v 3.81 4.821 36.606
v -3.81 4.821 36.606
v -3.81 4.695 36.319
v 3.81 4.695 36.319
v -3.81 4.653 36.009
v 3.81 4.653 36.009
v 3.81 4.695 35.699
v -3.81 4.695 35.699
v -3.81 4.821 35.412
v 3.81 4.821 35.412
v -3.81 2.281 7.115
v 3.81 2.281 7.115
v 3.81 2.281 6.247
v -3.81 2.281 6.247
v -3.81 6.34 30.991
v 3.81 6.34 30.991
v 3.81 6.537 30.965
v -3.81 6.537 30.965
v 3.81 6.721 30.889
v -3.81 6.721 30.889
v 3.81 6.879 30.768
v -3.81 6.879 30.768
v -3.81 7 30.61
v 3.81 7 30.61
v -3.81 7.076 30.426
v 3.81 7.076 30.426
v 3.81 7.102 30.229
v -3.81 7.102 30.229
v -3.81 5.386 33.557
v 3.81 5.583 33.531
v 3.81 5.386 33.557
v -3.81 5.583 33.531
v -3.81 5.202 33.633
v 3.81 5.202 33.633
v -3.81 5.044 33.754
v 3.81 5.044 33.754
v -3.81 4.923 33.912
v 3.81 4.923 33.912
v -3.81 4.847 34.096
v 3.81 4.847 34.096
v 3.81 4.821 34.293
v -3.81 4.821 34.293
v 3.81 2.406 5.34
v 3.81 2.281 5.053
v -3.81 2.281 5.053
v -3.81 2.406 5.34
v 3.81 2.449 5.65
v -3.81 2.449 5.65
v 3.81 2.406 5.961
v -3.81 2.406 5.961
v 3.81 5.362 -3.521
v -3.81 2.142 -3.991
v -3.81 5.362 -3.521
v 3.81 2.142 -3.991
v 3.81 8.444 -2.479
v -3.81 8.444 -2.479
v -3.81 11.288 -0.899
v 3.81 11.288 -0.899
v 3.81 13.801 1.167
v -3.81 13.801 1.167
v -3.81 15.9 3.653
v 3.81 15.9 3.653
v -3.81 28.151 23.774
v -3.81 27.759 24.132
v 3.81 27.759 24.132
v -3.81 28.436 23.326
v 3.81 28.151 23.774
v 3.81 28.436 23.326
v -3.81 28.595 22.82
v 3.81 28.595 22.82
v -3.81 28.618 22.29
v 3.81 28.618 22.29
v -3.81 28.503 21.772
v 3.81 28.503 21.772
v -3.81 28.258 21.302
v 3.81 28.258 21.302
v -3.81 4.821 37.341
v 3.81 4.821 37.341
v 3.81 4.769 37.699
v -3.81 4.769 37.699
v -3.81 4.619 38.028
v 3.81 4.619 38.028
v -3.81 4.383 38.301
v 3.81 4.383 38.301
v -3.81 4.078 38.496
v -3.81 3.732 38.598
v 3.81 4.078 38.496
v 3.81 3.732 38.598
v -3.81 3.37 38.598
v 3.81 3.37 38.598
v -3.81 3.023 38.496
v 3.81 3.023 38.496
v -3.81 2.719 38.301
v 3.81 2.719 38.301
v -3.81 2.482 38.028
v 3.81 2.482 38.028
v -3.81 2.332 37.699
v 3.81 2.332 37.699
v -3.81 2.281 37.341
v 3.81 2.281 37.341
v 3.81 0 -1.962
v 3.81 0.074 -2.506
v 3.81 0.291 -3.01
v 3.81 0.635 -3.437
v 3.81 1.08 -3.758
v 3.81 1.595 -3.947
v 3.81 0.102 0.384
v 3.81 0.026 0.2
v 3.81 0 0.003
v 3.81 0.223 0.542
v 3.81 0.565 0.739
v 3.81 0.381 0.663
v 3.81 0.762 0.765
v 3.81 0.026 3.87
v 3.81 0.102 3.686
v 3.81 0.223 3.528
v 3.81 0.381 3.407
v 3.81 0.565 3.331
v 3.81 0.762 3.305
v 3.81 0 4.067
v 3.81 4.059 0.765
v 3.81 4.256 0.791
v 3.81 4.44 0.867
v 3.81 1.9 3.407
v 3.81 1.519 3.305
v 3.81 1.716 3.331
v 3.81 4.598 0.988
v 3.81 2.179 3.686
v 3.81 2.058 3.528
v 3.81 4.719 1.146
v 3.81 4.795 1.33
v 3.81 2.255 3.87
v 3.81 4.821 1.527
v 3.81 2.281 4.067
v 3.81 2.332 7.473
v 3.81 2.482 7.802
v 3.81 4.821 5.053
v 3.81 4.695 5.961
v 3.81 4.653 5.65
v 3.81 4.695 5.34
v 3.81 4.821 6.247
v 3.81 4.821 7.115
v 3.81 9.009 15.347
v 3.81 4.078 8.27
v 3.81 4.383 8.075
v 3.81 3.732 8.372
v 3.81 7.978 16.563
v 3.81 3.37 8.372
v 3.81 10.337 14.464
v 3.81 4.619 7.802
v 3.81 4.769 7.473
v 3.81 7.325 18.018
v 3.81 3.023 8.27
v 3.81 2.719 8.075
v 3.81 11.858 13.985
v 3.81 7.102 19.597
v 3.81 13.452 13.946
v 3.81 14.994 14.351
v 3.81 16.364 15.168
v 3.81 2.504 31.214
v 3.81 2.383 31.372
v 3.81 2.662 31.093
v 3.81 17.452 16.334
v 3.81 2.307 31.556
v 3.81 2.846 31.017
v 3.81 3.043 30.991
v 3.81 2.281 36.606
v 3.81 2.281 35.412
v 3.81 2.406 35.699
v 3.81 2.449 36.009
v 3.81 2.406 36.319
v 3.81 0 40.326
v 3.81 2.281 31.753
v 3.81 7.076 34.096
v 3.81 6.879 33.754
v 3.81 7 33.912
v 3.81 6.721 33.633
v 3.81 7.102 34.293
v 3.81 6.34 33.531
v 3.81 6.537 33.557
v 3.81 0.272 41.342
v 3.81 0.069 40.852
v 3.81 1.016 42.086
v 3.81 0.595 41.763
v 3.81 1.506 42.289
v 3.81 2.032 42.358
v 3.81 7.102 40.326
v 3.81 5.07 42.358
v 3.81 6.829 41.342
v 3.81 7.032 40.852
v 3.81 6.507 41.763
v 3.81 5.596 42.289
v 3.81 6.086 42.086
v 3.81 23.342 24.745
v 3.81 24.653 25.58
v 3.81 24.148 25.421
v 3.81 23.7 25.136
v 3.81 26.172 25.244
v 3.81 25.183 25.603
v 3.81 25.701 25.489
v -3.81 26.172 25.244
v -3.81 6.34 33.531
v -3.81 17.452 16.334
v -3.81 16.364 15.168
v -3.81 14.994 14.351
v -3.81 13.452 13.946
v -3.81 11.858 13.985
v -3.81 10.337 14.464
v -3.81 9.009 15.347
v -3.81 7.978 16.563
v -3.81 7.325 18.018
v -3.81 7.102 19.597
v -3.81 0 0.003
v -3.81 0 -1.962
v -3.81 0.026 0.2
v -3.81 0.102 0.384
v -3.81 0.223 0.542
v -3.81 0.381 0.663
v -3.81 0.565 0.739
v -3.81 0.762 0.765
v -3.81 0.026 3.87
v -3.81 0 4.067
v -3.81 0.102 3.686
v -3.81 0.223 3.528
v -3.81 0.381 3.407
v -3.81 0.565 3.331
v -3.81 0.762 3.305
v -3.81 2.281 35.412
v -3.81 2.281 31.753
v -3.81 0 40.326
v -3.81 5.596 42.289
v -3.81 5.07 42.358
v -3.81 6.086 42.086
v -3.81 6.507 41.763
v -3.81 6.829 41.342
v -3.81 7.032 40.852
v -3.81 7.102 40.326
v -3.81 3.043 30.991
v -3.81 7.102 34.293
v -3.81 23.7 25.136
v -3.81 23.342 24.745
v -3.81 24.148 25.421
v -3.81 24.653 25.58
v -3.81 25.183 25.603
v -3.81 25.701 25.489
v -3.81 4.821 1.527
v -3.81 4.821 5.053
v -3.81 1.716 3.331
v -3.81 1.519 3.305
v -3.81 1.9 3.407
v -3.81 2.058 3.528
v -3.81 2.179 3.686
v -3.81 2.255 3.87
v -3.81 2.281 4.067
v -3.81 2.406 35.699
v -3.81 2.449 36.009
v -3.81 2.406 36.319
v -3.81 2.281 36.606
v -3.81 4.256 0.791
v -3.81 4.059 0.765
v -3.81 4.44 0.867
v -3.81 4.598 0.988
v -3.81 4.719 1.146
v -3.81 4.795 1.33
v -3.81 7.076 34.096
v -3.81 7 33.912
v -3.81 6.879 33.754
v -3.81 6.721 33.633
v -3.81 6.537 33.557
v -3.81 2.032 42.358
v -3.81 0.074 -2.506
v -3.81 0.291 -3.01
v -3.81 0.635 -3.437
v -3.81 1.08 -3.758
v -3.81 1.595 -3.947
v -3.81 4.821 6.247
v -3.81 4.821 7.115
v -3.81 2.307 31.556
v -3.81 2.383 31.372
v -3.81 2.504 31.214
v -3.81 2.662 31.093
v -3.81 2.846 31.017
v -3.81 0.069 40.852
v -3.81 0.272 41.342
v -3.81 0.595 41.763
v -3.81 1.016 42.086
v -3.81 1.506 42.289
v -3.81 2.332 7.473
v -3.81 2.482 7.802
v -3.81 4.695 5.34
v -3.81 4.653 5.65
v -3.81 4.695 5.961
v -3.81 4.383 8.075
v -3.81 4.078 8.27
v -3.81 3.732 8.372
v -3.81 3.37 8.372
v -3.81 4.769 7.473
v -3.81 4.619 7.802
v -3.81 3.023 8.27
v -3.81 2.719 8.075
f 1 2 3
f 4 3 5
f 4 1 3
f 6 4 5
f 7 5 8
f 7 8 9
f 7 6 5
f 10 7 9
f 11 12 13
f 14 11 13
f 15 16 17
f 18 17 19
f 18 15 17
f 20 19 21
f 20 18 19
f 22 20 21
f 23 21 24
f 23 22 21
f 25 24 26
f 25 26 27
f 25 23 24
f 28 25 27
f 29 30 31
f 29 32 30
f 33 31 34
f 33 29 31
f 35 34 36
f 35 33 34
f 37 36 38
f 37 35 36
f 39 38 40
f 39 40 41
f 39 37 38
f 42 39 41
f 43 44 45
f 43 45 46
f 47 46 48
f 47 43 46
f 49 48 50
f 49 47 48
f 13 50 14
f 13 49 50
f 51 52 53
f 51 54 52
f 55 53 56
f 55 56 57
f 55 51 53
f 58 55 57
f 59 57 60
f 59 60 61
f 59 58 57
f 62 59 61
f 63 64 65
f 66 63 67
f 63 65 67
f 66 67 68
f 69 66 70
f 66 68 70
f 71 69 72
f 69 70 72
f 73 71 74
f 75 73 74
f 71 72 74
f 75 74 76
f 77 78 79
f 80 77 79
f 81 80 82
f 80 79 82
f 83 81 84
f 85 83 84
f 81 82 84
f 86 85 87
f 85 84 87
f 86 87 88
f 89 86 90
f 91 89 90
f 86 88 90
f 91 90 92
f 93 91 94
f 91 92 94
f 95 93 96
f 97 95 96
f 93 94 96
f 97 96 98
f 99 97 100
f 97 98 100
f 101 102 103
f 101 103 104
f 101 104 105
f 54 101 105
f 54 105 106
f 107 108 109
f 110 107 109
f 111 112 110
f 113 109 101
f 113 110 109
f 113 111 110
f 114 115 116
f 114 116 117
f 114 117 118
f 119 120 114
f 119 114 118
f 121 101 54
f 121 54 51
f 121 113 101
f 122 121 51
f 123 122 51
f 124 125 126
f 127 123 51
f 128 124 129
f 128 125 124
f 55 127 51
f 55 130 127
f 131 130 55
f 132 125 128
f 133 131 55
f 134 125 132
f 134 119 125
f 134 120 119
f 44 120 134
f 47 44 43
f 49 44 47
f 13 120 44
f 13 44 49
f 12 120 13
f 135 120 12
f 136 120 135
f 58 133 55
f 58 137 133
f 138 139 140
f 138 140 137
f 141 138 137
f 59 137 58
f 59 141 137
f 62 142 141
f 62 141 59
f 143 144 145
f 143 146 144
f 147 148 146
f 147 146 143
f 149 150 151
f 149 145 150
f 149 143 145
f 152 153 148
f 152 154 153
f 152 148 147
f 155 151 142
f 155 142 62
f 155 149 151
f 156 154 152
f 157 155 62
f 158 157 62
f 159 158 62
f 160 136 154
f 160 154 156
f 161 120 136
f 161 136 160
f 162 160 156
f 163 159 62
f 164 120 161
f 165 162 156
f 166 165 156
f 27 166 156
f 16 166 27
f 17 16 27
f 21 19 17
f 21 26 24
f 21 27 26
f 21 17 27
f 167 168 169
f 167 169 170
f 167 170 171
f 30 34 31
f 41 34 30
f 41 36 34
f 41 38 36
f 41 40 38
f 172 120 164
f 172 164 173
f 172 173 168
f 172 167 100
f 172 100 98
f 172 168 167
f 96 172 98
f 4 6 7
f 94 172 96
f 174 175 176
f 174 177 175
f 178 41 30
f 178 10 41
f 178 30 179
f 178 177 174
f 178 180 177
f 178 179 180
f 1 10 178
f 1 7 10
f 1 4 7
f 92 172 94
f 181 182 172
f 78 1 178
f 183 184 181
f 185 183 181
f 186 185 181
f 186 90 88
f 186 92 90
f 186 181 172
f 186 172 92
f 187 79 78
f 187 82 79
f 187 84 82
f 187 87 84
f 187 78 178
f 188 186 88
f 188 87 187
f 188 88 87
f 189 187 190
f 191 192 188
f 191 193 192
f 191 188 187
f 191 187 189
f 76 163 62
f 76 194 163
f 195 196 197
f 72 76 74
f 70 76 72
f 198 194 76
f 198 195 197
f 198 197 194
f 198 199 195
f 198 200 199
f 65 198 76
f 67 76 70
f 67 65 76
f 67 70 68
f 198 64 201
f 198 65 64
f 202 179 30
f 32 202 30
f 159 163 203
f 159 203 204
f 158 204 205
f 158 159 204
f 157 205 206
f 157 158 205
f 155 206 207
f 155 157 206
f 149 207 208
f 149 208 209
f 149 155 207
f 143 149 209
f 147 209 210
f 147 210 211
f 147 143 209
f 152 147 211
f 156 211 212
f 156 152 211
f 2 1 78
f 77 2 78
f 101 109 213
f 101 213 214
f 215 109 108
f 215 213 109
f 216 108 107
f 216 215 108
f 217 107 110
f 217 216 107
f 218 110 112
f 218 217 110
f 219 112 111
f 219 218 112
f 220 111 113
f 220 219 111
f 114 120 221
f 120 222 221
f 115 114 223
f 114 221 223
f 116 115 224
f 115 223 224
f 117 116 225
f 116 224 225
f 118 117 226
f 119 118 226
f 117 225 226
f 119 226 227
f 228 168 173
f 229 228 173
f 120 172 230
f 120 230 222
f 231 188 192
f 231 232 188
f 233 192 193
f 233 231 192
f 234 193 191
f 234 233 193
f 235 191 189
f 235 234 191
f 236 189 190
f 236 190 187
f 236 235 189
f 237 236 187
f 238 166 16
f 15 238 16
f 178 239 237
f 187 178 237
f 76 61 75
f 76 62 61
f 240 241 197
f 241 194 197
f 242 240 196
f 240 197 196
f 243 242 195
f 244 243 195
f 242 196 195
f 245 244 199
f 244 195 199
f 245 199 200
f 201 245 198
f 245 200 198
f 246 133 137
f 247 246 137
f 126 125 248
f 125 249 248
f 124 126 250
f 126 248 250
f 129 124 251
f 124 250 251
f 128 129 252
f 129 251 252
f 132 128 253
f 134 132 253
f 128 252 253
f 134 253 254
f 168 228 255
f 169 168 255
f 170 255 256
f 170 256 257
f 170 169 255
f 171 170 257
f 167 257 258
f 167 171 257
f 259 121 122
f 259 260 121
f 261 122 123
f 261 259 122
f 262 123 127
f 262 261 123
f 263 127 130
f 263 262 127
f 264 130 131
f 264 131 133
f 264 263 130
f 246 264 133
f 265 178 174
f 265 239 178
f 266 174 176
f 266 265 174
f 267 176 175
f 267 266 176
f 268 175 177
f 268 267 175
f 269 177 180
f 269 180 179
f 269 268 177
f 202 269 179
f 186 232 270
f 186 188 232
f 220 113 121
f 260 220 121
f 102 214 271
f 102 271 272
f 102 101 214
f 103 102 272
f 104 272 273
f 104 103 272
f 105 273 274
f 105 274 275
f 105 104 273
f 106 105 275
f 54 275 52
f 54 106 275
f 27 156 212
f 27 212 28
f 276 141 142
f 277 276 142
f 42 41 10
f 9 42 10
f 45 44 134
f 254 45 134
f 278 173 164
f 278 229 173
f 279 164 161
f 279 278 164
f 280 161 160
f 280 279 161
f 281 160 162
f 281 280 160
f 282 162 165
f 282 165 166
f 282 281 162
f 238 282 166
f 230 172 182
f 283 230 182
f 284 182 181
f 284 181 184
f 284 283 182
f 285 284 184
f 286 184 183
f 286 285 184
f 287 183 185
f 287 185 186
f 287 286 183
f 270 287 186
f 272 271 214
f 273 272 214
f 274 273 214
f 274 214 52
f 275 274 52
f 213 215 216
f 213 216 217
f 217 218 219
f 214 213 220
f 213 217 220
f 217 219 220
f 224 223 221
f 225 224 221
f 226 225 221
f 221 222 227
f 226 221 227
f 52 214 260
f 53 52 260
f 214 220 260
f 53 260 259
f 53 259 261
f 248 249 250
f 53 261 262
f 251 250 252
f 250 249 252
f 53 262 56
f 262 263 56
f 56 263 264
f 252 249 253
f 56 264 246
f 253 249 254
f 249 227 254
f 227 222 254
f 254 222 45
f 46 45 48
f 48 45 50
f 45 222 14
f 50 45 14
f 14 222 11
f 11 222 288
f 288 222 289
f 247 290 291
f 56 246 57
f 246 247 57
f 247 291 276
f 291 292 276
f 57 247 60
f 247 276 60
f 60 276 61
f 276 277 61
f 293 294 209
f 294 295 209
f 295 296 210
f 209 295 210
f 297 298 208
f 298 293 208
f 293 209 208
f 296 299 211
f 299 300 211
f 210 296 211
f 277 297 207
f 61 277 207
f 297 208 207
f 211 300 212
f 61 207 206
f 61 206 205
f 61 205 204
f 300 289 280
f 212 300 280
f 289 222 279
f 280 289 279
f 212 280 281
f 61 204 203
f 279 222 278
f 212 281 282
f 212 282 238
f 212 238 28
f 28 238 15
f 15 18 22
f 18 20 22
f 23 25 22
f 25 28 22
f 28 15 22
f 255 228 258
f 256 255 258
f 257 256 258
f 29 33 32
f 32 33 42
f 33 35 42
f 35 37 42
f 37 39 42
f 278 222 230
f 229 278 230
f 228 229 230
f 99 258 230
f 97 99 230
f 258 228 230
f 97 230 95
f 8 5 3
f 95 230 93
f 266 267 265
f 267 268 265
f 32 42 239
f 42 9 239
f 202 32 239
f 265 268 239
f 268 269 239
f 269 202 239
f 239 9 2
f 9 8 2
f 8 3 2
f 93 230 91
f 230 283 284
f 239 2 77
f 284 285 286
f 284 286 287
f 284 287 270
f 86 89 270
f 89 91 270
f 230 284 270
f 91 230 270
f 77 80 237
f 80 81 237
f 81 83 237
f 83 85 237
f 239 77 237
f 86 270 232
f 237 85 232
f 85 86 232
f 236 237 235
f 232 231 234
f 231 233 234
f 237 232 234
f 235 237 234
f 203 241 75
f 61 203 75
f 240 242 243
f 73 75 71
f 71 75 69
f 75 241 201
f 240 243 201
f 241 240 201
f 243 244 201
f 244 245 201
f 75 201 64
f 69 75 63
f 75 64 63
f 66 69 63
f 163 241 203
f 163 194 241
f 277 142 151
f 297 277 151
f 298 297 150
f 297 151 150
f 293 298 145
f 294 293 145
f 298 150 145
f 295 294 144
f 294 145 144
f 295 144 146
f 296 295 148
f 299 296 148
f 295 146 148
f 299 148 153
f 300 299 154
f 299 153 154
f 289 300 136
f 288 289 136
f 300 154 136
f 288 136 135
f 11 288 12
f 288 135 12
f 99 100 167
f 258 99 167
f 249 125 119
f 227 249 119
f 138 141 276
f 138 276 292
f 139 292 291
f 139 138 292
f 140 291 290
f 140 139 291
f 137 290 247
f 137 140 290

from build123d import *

# Parameters (mm, degrees)
F1_DEPTH = 3.81
F2_R     = 2.032
F4_DEPTH = 7.621
F5_R     = 0.762
F7_DEPTH = 7.62


# Not quite as in the source:
# - a feature names something its author has since deleted; it is built from what else it names


with BuildPart() as f1:
    # F0 (on Right) → F1 (new body, symmetric)
    with BuildSketch(Plane.YZ):
        with BuildLine():
            Line((0, 42.3580370843), (0, 0))
            Line((0, 0), (0, -3.979871033))
            ThreePointArc((0, -3.979871033), (8.9499402185, -2.2460183558), (15.9004898533, 3.6529251764))
            Line((15.9004898533, 3.6529251764), (29.4239599312, 22.9664420122))
            Line((29.4239599312, 22.9664420122), (24.5073227445, 26.4091084329))
            Line((24.5073227445, 26.4091084329), (17.4524241549, 16.3336690744))
            ThreePointArc((17.4524241549, 16.3336690744), (11.0805919315, 14.1707234894), (7.1017071605, 19.5972376068))
            Line((7.1017071605, 19.5972376068), (7.1017071605, 42.3580370843))
            Line((7.1017071605, 42.3580370843), (0, 42.3580370843))
        make_face()
    extrude(amount=F1_DEPTH, both=True)

    # F2
    f2_edges = [f1.edges().sort_by_distance(p)[0] for p in [
        (0, 7.101707, 42.358037),
        (0, 0, 42.358037),
        (0, 29.42396, 22.966442),
        (0, 24.507323, 26.409108),
        (0, 0, -3.979871),
    ]]
    fillet(f2_edges, radius=F2_R)

    # F3 (on face) → F4 (cut, through all)
    with BuildSketch(Plane.YZ.offset(3.81)):
        with BuildLine():
            Line((4.8208535802, 33.5311107337), (4.8208535802, 37.3411107337))
            ThreePointArc((4.8208535802, 37.3411107337), (3.5508535802, 38.6111107337), (2.2808535802, 37.3411107337))
            Line((2.2808535802, 37.3411107337), (2.2808535802, 30.9911107337))
            Line((2.2808535802, 30.9911107337), (7.1017071605, 30.9911107337))
            Line((7.1017071605, 30.9911107337), (7.1017071605, 33.5311107337))
            Line((7.1017071605, 33.5311107337), (4.8208535802, 33.5311107337))
        make_face()
        with BuildLine():
            Line((4.8208535802, 0.7651107337), (4.8208535802, 7.1151107337))
            ThreePointArc((4.8208535802, 7.1151107337), (3.5508535802, 8.3851107337), (2.2808535802, 7.1151107337))
            Line((2.2808535802, 7.1151107337), (2.2808535802, 3.3051107337))
            Line((2.2808535802, 3.3051107337), (0, 3.3051107337))
            Line((0, 3.3051107337), (0, 0.7651107337))
            Line((0, 0.7651107337), (4.8208535802, 0.7651107337))
        make_face()
    extrude(amount=-F4_DEPTH, mode=Mode.SUBTRACT)

    # F5
    f5_edges = [f1.edges().sort_by_distance(p)[0] for p in [
        (0, 4.820854, 33.531111),
        (0, 7.101707, 33.531111),
        (0, 2.280854, 30.991111),
        (0, 7.101707, 30.991111),
        (0, 0, 3.305111),
        (0, 4.820854, 0.765111),
        (0, 0, 0.765111),
        (0, 2.280854, 3.305111),
    ]]
    fillet(f5_edges, radius=F5_R)

    # F6 (on face) → F7 (join, through all)
    with BuildSketch(Plane.YZ.offset(3.81)):
        with BuildLine():
            Line((4.8208535802, 35.4121252894), (4.8208535802, 36.6062968969))
            ThreePointArc((4.8208535802, 36.6062968969), (4.6525009744, 36.0092110932), (4.8208535802, 35.4121252894))
        make_face()
        with BuildLine():
            Line((2.2808535802, 36.6062968969), (2.2808535802, 35.4121252894))
            ThreePointArc((2.2808535802, 35.4121252894), (2.4492061861, 36.0092110932), (2.2808535802, 36.6062968969))
        make_face()
        with BuildLine():
            Line((2.2808535802, 6.2474817969), (2.2808535802, 5.0533101894))
            ThreePointArc((2.2808535802, 5.0533101894), (2.4492061861, 5.6503959931), (2.2808535802, 6.2474817969))
        make_face()
        with BuildLine():
            ThreePointArc((4.8208535802, 6.2474817969), (4.6525009744, 5.6503959931), (4.8208535802, 5.0533101894))
            Line((4.8208535802, 5.0533101894), (4.8208535802, 6.2474817969))
        make_face()
    extrude(amount=-F7_DEPTH)


solid = f1.part
